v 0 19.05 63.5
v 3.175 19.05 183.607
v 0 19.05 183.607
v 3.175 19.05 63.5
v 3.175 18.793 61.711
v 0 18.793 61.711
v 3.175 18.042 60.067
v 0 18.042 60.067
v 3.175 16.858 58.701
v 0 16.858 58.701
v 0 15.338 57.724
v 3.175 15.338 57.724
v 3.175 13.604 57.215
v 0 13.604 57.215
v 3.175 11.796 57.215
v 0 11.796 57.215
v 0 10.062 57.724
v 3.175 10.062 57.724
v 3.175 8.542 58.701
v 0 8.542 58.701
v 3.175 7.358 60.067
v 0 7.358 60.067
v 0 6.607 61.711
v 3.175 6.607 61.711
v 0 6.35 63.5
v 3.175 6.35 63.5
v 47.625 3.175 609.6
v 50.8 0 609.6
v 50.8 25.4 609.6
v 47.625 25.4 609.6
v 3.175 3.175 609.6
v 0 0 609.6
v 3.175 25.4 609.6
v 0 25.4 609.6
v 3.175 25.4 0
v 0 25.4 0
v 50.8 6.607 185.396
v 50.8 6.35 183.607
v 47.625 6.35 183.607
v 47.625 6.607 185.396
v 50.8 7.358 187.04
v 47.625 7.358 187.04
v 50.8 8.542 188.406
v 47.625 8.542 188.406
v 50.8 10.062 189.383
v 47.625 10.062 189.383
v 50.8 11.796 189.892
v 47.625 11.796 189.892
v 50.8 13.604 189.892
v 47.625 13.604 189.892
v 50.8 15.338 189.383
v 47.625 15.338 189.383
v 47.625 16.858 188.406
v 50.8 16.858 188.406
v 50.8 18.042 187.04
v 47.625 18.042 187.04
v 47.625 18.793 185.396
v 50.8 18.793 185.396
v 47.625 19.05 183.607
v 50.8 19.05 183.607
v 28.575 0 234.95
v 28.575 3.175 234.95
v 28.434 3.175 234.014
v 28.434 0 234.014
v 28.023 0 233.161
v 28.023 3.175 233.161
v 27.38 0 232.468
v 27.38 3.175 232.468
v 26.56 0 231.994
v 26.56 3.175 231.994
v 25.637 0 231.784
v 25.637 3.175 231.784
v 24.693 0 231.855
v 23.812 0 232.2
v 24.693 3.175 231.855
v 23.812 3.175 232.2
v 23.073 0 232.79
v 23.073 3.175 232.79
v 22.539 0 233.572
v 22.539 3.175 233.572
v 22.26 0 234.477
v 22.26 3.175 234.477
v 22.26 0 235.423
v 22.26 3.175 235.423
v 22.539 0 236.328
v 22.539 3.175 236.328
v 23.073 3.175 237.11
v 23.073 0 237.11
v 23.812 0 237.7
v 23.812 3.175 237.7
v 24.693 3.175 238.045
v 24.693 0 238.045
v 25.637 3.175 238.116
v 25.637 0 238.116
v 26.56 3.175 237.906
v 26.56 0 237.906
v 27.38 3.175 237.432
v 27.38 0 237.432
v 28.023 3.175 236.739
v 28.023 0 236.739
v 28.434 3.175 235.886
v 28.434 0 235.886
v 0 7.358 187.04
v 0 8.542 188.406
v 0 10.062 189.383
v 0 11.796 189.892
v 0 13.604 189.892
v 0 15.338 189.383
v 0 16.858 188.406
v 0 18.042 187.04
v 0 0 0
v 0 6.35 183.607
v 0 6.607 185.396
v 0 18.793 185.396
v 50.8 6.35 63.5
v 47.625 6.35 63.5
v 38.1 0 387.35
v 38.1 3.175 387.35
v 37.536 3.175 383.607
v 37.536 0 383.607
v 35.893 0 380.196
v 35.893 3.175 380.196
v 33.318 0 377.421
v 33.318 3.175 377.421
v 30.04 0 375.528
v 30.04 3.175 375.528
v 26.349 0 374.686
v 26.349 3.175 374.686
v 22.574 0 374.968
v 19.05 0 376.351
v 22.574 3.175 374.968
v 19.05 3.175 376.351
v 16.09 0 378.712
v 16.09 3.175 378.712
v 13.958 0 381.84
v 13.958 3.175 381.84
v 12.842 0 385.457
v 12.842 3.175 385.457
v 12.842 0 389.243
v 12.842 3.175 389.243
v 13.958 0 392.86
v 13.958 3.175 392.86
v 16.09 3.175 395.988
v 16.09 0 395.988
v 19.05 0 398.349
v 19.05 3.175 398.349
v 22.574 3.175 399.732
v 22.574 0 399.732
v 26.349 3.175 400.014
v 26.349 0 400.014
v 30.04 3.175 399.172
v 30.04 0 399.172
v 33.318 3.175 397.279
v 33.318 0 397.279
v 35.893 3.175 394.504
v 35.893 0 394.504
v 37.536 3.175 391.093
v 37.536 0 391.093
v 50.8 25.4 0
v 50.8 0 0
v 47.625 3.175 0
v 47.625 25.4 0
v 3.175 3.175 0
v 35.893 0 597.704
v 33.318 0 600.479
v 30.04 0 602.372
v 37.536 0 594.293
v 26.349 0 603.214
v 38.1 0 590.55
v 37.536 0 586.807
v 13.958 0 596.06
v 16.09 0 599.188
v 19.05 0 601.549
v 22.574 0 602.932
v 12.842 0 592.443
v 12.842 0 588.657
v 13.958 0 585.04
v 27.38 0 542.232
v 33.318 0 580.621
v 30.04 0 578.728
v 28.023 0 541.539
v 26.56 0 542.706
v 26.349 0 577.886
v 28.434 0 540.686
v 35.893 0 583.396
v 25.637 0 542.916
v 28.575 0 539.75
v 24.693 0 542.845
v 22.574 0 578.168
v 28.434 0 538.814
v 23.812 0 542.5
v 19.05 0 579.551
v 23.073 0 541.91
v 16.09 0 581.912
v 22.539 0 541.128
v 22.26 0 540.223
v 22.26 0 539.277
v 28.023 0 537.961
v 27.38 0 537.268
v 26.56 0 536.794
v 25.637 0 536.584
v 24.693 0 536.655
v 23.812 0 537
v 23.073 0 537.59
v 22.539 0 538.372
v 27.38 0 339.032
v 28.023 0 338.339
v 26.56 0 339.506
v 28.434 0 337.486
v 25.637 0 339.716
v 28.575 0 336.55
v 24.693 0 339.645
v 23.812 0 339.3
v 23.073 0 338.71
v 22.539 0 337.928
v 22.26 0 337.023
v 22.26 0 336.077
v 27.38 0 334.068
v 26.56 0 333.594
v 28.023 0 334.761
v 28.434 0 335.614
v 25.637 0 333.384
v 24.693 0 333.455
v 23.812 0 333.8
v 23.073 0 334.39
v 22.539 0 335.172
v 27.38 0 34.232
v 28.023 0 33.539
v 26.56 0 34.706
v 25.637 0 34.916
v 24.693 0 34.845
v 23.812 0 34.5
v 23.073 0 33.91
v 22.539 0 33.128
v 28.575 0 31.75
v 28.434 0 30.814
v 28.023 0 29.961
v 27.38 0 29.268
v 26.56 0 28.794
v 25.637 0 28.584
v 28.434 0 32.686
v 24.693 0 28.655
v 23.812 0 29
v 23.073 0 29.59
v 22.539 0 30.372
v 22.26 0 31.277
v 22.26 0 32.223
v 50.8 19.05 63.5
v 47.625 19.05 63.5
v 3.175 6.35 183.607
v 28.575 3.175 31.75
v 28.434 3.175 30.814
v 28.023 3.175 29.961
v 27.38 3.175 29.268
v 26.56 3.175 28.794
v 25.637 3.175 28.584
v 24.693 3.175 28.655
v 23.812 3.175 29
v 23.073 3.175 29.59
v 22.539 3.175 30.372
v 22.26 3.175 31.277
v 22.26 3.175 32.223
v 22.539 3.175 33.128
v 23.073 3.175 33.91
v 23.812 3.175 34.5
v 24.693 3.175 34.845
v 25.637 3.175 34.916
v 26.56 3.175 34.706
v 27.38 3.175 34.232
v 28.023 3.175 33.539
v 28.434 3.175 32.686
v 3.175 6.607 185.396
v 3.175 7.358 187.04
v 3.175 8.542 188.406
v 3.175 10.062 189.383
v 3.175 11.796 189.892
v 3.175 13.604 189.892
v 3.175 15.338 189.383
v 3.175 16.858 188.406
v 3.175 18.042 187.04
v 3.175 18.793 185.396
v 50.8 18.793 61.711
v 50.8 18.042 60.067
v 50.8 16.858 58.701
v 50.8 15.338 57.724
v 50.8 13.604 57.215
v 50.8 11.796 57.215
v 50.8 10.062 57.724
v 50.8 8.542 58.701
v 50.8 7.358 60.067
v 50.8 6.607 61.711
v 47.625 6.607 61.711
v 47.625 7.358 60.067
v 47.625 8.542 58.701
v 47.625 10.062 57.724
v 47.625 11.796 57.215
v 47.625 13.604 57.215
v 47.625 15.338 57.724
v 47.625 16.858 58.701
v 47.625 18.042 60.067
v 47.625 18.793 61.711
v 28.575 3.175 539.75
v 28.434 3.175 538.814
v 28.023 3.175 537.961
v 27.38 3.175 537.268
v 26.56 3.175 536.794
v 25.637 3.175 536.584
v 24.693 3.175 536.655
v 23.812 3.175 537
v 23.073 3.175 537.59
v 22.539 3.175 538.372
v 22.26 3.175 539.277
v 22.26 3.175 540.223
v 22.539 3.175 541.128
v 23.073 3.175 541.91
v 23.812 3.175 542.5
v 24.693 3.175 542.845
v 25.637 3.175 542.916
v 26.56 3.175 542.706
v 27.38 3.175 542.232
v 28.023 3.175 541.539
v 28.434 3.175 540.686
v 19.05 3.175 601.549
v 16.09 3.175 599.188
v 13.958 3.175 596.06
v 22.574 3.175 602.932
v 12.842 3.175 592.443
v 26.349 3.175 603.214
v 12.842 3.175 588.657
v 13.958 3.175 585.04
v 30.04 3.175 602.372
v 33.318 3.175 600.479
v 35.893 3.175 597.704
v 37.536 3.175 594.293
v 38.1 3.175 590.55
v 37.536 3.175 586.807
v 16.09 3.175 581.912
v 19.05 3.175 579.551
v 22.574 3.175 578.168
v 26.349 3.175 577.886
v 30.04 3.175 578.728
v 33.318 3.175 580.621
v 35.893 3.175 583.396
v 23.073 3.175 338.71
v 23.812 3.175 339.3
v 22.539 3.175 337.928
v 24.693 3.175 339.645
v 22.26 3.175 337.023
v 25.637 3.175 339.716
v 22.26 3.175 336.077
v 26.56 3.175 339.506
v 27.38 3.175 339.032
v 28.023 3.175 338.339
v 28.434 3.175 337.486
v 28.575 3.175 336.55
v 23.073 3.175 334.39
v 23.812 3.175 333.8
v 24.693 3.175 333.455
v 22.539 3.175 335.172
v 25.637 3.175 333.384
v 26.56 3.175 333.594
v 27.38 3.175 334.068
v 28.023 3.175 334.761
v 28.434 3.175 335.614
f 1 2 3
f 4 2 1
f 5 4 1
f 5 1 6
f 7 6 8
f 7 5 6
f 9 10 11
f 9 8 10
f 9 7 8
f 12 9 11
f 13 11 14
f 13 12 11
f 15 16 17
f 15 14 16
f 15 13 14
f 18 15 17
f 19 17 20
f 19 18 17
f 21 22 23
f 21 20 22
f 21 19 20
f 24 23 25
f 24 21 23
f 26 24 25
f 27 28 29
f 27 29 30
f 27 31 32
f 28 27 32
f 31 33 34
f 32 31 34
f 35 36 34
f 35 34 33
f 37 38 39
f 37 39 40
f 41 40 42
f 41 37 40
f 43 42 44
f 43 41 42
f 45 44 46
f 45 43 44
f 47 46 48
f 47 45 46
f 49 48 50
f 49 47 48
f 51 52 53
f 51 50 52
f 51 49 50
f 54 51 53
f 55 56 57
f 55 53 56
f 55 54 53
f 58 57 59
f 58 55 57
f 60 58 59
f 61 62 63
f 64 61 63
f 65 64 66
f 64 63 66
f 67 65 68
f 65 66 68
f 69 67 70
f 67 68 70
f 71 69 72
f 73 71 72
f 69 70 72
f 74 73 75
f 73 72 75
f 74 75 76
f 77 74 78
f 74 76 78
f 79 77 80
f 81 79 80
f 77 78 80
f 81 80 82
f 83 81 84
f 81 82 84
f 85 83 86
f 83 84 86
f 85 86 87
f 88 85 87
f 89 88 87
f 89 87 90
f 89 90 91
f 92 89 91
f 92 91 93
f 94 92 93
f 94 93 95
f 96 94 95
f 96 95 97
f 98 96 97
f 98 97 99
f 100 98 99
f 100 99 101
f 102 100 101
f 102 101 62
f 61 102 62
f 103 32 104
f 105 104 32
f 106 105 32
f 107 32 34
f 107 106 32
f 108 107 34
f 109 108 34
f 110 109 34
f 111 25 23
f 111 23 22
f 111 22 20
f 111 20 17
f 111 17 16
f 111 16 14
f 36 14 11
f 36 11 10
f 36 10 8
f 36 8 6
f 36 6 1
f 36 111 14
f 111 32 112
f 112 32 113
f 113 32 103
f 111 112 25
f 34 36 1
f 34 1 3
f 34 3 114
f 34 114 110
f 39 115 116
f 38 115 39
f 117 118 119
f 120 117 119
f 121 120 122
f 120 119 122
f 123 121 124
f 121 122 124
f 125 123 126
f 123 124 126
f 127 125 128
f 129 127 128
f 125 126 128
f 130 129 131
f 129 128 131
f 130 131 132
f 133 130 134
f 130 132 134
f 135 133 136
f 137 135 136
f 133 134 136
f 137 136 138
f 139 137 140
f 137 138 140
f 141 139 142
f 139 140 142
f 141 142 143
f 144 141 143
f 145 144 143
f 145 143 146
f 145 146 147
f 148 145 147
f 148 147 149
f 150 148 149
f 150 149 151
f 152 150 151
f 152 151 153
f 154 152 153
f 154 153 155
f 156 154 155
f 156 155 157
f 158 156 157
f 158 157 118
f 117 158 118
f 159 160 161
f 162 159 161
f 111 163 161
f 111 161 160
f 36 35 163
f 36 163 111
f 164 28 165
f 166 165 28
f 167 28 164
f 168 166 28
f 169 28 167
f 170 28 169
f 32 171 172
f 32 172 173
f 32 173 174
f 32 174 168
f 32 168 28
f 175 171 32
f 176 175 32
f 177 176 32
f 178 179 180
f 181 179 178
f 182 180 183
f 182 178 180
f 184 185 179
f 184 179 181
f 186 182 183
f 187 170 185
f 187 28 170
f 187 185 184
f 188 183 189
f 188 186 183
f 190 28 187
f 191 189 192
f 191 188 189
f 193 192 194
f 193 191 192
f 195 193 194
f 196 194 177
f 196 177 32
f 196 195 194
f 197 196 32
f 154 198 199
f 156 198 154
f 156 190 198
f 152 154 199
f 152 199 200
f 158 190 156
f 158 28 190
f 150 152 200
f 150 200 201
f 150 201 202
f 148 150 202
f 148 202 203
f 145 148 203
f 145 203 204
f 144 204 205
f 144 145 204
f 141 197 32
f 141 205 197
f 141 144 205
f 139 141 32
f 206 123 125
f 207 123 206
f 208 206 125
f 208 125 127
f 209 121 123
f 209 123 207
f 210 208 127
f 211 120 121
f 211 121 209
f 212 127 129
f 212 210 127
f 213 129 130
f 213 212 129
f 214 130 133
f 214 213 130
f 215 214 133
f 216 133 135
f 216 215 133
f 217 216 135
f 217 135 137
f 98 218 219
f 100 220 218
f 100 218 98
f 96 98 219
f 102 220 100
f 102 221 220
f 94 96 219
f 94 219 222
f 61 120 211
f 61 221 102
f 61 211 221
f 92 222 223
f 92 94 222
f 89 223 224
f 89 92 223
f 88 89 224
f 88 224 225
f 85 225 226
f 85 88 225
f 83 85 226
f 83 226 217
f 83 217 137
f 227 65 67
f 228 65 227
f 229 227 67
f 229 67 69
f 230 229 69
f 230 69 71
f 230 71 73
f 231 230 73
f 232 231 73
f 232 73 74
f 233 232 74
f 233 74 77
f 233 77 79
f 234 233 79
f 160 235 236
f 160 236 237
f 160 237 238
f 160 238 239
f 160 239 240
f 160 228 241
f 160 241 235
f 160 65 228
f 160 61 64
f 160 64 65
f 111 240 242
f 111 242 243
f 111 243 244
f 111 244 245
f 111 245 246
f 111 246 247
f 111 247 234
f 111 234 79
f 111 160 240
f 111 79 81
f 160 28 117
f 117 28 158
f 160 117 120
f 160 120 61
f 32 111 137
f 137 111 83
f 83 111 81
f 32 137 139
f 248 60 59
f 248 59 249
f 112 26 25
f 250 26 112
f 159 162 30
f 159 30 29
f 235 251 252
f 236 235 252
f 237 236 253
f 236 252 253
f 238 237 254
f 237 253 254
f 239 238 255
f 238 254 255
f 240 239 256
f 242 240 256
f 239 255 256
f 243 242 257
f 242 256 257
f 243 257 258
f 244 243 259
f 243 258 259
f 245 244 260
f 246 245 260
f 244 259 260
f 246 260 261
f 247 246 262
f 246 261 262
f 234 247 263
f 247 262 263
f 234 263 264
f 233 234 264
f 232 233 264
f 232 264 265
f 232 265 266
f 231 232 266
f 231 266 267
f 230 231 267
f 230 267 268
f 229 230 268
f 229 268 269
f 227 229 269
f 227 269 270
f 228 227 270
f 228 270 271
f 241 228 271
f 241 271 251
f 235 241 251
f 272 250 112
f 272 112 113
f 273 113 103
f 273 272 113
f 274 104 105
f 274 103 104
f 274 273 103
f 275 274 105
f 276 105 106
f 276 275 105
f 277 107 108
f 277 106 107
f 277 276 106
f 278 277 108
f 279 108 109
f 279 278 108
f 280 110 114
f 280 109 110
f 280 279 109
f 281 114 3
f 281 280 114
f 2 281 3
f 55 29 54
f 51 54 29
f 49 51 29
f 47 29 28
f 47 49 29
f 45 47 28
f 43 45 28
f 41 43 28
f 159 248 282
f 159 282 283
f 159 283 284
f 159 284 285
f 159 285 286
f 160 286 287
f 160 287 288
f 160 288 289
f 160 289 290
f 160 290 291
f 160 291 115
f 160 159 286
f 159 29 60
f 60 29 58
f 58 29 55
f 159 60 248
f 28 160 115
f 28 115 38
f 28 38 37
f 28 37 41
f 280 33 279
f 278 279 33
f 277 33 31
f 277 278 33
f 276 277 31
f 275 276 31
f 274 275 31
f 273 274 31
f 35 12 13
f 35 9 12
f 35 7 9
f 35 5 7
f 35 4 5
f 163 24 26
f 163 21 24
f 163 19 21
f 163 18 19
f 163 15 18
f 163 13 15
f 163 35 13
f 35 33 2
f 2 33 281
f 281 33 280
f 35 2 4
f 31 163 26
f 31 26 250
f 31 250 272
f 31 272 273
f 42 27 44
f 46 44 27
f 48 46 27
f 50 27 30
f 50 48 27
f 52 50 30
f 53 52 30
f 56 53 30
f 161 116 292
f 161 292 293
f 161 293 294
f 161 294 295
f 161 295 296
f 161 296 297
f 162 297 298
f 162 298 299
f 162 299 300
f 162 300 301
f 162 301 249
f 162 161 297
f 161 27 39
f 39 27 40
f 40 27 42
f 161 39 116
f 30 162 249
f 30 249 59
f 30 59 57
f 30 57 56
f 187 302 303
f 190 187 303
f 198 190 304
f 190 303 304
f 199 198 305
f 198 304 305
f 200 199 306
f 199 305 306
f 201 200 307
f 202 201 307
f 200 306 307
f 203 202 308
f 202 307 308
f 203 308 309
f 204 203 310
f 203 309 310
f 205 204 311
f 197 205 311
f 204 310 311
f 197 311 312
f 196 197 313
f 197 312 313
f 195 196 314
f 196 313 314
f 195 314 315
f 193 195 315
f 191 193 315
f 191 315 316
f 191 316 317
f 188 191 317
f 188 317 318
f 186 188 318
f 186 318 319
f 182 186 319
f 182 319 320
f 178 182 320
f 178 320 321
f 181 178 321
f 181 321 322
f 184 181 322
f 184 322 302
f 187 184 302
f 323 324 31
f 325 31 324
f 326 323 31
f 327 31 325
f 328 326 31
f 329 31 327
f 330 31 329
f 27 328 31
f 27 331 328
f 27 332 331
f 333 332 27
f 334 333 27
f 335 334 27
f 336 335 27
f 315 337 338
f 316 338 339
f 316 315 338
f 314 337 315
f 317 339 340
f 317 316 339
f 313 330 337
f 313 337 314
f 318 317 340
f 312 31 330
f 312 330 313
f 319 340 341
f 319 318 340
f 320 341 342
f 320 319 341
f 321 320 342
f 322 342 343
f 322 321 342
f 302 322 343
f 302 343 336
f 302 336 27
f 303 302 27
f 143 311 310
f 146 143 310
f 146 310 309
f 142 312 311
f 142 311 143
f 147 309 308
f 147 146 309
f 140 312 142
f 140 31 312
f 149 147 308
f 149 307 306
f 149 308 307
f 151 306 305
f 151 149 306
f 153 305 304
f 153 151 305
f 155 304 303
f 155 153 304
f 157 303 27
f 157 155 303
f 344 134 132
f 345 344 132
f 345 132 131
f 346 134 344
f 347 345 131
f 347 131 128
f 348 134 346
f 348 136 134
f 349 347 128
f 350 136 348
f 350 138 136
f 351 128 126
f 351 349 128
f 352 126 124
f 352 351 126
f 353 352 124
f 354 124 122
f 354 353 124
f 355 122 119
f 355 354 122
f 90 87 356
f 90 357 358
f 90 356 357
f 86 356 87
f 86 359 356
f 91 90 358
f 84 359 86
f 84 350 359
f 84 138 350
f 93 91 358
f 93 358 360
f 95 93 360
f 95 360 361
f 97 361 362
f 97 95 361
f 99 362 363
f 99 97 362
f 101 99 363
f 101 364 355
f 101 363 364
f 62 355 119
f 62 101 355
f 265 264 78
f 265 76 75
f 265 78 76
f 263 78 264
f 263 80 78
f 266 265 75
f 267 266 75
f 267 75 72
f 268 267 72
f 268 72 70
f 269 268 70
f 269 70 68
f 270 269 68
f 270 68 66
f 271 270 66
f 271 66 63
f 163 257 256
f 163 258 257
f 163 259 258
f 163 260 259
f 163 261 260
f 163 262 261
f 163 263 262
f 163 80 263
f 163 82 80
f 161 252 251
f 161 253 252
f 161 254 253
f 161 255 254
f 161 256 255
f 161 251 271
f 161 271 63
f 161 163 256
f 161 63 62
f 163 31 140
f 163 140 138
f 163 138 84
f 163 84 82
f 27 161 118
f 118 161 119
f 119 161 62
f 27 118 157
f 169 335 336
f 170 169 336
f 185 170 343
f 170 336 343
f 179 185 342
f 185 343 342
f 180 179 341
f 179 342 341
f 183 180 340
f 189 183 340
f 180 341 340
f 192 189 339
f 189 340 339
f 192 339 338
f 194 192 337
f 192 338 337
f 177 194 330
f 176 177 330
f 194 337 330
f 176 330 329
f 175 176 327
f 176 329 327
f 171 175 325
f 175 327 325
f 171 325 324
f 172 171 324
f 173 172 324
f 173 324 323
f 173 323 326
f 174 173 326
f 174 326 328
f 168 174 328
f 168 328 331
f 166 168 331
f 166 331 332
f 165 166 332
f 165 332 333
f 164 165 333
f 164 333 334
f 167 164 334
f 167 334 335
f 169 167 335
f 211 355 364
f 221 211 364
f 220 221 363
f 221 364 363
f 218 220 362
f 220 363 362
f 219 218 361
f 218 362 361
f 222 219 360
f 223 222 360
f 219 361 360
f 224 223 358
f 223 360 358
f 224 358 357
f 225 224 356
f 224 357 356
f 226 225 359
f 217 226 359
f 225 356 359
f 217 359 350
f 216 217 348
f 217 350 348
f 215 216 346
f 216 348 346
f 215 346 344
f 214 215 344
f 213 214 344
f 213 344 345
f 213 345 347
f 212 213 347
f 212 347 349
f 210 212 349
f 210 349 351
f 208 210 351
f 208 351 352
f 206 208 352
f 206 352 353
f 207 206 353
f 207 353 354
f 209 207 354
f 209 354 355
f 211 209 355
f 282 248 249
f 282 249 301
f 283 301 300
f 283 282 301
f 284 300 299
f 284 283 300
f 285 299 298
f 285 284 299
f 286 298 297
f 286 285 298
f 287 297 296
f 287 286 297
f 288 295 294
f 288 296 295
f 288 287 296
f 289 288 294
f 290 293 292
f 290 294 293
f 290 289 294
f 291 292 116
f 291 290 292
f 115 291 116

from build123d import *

# Parameters (mm, degrees)
BOSS_EXTRUDE1_DEPTH = 609.6
CUT_EXTRUDE1_REACH  = 5.175
SKETCH2_R           = 12.7
SKETCH2_R_2         = 3.175
CUT_EXTRUDE2_REACH  = 5.175
SKETCH3_R           = 3.175
CUT_EXTRUDE3_DEPTH  = 51.8


with BuildPart() as part:
    # Sketch1 → Boss-Extrude1 (new body)
    with BuildSketch(Plane.XY):
        Polygon((47.625, 3.175), (47.625, 25.4), (50.8, 25.4), (50.8, 0), (0, 0), (0, 25.4), (3.175, 25.4), (3.175, 3.175), align=None)
    extrude(amount=BOSS_EXTRUDE1_DEPTH)

    # Sketch2 → Cut-Extrude1 (cut, up to next)
    with BuildSketch(Plane(origin=(0, 3.175, 0), x_dir=(1, 0, 0), z_dir=(0, 1, 0)), mode=Mode.PRIVATE) as cut_extrude1_sk1:
        with Locations((25.4, -590.55)):
            Circle(SKETCH2_R)
    cut_extrude1_tool1 = extrude(cut_extrude1_sk1.sketch, amount=-CUT_EXTRUDE1_REACH, mode=Mode.PRIVATE) & part.part
    add(cut_extrude1_tool1.solids().sort_by_distance((25.4, 3.175, 590.55))[0], mode=Mode.SUBTRACT)
    # Sketch2 → Cut-Extrude1 (cut, up to next)
    with BuildSketch(Plane(origin=(0, 3.175, 0), x_dir=(1, 0, 0), z_dir=(0, 1, 0)), mode=Mode.PRIVATE) as cut_extrude1_sk2:
        with Locations((25.4, -387.35)):
            Circle(SKETCH2_R)
    cut_extrude1_tool2 = extrude(cut_extrude1_sk2.sketch, amount=-CUT_EXTRUDE1_REACH, mode=Mode.PRIVATE) & part.part
    add(cut_extrude1_tool2.solids().sort_by_distance((25.4, 3.175, 387.35))[0], mode=Mode.SUBTRACT)
    # Sketch2 → Cut-Extrude1 (cut, up to next)
    with BuildSketch(Plane(origin=(0, 3.175, 0), x_dir=(1, 0, 0), z_dir=(0, 1, 0)), mode=Mode.PRIVATE) as cut_extrude1_sk3:
        with Locations((25.4, -539.75)):
            Circle(SKETCH2_R_2)
    cut_extrude1_tool3 = extrude(cut_extrude1_sk3.sketch, amount=-CUT_EXTRUDE1_REACH, mode=Mode.PRIVATE) & part.part
    add(cut_extrude1_tool3.solids().sort_by_distance((25.4, 3.175, 539.75))[0], mode=Mode.SUBTRACT)
    # Sketch2 → Cut-Extrude1 (cut, up to next)
    with BuildSketch(Plane(origin=(0, 3.175, 0), x_dir=(1, 0, 0), z_dir=(0, 1, 0)), mode=Mode.PRIVATE) as cut_extrude1_sk4:
        with Locations((25.4, -336.55)):
            Circle(SKETCH2_R_2)
    cut_extrude1_tool4 = extrude(cut_extrude1_sk4.sketch, amount=-CUT_EXTRUDE1_REACH, mode=Mode.PRIVATE) & part.part
    add(cut_extrude1_tool4.solids().sort_by_distance((25.4, 3.175, 336.55))[0], mode=Mode.SUBTRACT)

    # Sketch3 → Cut-Extrude2 (cut, up to next)
    with BuildSketch(Plane(origin=(0, 3.175, 0), x_dir=(1, 0, 0), z_dir=(0, 1, 0)), mode=Mode.PRIVATE) as cut_extrude2_sk1:
        with Locations((25.4, -234.95)):
            Circle(SKETCH3_R)
    cut_extrude2_tool1 = extrude(cut_extrude2_sk1.sketch, amount=-CUT_EXTRUDE2_REACH, mode=Mode.PRIVATE) & part.part
    add(cut_extrude2_tool1.solids().sort_by_distance((25.4, 3.175, 234.95))[0], mode=Mode.SUBTRACT)
    # Sketch3 → Cut-Extrude2 (cut, up to next)
    with BuildSketch(Plane(origin=(0, 3.175, 0), x_dir=(1, 0, 0), z_dir=(0, 1, 0)), mode=Mode.PRIVATE) as cut_extrude2_sk2:
        with Locations((25.4, -31.75)):
            Circle(SKETCH3_R)
    cut_extrude2_tool2 = extrude(cut_extrude2_sk2.sketch, amount=-CUT_EXTRUDE2_REACH, mode=Mode.PRIVATE) & part.part
    add(cut_extrude2_tool2.solids().sort_by_distance((25.4, 3.175, 31.75))[0], mode=Mode.SUBTRACT)

    # Sketch4 → Cut-Extrude3 (cut, through all)
    with BuildSketch(Plane(origin=(50.8, 0, 0), x_dir=(0, 0, -1), z_dir=(1, 0, 0))):
        with BuildLine():
            Line((-183.606708986, 19.05), (-63.5, 19.05))
            ThreePointArc((-63.5, 19.05), (-57.15, 12.7), (-63.5, 6.35))
            Line((-63.5, 6.35), (-183.606708986, 6.35))
            ThreePointArc((-183.606708986, 6.35), (-189.956708986, 12.7), (-183.606708986, 19.05))
        make_face()
    extrude(amount=-CUT_EXTRUDE3_DEPTH, mode=Mode.SUBTRACT)


solid = part.part
